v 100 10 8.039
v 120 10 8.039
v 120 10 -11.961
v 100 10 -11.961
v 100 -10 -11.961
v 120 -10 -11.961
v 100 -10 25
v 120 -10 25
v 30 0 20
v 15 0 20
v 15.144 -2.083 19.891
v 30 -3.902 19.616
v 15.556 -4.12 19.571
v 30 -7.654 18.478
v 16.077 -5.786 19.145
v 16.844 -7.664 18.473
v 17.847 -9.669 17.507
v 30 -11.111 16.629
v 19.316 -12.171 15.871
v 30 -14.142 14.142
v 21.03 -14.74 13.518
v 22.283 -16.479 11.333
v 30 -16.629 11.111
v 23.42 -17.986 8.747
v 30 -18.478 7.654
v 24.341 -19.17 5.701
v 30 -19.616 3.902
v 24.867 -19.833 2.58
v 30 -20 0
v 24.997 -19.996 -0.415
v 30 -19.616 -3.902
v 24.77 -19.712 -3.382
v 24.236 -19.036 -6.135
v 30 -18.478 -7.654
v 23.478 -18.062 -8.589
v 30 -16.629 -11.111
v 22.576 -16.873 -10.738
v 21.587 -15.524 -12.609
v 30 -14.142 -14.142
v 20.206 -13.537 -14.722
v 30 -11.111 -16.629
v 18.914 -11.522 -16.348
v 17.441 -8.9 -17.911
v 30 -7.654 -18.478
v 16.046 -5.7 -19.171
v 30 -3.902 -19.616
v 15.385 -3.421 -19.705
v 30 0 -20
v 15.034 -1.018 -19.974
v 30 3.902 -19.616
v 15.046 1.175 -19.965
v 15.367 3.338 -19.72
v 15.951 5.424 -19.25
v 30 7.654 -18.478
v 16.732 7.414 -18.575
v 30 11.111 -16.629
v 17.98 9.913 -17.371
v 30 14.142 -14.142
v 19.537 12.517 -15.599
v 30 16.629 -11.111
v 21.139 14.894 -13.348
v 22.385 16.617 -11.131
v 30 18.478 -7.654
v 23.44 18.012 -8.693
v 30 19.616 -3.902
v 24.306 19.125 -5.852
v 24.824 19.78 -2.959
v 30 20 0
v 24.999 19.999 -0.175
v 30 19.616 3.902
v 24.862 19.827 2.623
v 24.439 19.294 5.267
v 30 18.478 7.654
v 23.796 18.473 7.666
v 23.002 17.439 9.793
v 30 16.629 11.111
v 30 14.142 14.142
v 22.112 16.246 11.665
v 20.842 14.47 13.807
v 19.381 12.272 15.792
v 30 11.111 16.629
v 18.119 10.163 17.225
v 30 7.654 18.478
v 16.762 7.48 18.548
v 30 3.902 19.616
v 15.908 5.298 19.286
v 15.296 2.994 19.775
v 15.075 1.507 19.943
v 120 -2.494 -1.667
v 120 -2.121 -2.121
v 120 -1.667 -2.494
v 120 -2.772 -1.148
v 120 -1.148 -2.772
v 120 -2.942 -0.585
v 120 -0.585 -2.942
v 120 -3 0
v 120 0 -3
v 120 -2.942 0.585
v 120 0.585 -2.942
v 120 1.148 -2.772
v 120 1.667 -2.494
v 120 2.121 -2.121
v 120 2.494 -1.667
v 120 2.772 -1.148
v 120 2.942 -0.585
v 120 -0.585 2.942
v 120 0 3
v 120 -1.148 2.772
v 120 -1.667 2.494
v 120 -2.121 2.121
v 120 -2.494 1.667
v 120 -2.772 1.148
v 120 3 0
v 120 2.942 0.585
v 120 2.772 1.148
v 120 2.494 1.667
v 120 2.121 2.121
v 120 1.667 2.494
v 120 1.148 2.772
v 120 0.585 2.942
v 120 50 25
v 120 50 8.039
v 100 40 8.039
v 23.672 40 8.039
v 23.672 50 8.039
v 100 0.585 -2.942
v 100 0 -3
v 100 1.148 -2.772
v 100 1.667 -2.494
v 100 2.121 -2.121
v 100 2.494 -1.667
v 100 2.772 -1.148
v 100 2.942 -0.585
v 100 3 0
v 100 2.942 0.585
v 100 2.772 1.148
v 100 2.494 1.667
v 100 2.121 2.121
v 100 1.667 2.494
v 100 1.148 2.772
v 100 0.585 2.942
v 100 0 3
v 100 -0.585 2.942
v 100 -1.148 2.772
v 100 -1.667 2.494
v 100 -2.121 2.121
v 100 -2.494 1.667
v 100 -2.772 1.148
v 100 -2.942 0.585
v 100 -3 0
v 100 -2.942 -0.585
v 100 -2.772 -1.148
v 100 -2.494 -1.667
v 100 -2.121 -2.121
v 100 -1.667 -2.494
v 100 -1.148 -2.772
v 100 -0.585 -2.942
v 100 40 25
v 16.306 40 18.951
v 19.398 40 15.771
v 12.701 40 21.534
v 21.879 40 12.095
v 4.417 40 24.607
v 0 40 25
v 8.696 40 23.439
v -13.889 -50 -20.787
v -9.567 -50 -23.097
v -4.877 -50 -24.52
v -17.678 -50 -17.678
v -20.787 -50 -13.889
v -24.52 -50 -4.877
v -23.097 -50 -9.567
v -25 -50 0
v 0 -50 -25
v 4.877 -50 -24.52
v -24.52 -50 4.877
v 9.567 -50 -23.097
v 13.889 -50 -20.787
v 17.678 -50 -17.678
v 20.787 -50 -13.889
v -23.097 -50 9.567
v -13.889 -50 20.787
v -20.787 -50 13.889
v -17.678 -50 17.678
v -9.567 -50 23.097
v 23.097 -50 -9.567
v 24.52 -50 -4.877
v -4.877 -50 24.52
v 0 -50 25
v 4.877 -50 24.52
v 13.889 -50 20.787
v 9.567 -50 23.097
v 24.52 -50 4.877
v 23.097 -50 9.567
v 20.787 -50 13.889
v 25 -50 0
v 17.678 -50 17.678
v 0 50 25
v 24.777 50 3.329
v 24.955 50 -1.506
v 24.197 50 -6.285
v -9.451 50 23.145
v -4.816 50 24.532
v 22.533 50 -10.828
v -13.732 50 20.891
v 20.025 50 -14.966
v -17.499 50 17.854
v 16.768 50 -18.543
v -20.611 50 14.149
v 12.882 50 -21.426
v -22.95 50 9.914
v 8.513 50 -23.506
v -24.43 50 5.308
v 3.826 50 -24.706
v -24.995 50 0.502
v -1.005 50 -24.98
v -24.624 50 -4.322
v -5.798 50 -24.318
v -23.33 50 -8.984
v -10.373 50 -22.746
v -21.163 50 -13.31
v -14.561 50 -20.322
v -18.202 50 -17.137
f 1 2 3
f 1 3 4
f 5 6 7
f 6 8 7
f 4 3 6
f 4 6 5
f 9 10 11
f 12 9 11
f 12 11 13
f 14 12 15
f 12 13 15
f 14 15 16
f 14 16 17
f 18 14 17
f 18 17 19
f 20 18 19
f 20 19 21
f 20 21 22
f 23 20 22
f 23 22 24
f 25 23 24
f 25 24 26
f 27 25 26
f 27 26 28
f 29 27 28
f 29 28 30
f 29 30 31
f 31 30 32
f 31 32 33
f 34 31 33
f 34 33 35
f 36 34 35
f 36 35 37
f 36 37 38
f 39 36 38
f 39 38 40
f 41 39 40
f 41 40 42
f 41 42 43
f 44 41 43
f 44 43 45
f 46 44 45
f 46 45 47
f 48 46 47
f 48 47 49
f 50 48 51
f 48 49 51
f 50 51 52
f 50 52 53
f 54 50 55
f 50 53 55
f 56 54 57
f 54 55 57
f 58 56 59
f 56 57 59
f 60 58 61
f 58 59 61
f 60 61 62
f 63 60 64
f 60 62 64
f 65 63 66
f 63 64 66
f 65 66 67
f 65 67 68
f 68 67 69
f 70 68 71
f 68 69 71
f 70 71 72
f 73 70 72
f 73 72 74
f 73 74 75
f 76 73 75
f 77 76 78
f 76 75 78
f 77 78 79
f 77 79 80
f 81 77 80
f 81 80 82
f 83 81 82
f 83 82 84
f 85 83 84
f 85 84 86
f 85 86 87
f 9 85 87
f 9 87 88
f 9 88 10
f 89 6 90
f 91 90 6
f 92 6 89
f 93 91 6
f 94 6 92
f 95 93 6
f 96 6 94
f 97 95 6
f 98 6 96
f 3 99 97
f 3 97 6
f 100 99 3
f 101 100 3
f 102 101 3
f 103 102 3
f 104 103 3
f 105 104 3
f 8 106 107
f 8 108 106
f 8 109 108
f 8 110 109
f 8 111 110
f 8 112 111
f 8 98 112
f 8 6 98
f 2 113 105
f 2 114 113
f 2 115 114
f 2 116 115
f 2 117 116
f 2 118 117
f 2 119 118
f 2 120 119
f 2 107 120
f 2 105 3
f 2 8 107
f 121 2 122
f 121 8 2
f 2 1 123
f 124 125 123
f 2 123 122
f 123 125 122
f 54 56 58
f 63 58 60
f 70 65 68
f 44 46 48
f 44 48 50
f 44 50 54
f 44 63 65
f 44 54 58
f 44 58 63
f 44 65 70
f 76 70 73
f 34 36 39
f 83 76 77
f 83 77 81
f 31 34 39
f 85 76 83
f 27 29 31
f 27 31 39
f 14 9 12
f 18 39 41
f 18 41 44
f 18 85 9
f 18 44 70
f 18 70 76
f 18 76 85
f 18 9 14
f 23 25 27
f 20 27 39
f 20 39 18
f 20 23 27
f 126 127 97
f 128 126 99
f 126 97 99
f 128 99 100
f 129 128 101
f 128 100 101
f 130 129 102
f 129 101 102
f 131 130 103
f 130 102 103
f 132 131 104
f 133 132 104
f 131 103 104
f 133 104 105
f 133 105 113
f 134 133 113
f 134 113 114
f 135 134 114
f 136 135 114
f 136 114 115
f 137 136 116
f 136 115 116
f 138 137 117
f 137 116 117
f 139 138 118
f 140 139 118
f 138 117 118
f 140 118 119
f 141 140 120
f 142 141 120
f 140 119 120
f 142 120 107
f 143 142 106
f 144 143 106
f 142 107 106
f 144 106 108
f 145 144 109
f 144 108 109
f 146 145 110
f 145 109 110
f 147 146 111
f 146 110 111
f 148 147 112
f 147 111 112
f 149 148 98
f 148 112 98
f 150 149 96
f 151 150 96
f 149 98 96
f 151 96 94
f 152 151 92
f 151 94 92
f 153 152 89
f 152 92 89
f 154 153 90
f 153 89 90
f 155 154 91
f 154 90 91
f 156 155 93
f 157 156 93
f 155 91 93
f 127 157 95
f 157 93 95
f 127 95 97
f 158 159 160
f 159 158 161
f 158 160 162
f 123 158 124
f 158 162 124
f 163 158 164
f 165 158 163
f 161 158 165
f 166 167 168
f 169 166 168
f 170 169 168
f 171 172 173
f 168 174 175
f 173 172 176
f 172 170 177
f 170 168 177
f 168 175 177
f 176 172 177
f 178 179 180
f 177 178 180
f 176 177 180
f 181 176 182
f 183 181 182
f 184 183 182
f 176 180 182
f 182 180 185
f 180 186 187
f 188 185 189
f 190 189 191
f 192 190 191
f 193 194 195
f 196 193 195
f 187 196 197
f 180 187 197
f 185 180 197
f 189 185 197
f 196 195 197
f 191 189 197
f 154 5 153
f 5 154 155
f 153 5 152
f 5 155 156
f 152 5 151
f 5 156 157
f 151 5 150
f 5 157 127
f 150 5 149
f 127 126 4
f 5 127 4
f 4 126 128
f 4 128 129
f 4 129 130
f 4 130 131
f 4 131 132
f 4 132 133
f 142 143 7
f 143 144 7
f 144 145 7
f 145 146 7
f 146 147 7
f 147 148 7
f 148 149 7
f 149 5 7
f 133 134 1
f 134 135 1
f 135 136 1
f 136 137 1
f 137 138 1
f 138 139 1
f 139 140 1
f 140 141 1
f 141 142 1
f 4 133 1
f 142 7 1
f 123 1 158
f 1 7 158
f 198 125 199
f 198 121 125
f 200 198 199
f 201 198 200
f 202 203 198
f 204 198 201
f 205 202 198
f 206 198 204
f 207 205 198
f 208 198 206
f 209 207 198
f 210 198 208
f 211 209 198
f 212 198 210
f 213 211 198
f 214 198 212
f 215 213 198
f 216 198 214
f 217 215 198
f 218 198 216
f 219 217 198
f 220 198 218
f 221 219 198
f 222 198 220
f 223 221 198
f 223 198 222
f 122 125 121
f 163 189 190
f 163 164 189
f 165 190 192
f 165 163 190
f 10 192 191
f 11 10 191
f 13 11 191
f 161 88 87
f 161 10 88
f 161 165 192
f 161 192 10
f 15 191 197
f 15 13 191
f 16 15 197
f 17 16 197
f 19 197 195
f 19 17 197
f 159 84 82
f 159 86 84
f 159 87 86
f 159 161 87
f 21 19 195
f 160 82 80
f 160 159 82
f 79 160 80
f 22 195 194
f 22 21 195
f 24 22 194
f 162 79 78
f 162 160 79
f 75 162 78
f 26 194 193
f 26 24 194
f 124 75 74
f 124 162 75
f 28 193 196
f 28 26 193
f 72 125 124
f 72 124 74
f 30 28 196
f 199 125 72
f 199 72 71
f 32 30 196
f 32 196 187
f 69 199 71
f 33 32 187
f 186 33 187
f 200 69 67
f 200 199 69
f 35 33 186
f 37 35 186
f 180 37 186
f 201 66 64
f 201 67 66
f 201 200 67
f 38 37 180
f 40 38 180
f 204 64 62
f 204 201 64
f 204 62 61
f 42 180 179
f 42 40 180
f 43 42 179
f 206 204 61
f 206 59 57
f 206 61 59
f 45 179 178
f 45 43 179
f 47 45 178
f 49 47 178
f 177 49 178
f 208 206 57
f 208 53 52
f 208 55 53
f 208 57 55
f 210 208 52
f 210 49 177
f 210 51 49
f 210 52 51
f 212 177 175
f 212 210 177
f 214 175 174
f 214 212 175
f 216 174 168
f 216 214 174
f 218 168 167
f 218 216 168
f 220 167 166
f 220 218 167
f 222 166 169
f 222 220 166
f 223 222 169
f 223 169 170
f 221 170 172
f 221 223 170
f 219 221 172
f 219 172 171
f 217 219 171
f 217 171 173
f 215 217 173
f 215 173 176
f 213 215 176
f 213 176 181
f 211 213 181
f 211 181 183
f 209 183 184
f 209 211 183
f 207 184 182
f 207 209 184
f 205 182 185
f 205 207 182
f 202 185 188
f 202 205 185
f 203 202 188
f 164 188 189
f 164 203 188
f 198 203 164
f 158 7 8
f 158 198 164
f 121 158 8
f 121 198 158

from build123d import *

# Parameters (mm, degrees)
SKETCH1_R           = 25
BOSS_EXTRUDE1_DEPTH = 50
SKETCH2_R           = 20
BOSS_EXTRUDE2_DEPTH = 30
SKETCH3_W           = 16.960857005
SKETCH3_H           = 10
BOSS_EXTRUDE3_DEPTH = 120
SKETCH4_W           = 20
SKETCH4_H           = 16.960857005
BOSS_EXTRUDE4_DEPTH = 50
SKETCH5_W           = 20
SKETCH5_H           = 20
BOSS_EXTRUDE5_DEPTH = 20
SKETCH6_R           = 3
CUT_EXTRUDE1_DEPTH  = 20


with BuildPart() as part:
    # Sketch1 → Boss-Extrude1 (new, symmetric)
    with BuildSketch(Plane(origin=(0, 0, 0), x_dir=(1, 0, 0), z_dir=(0, 1, 0))):
        with Locations(Location((0, 0, 0), (0, 0, 270))):
            Circle(SKETCH1_R)
    extrude(amount=BOSS_EXTRUDE1_DEPTH, both=True)

    # Sketch2 → Boss-Extrude2 (add)
    with BuildSketch(Plane(origin=(0, 0, 0), x_dir=(0, 0, -1), z_dir=(1, 0, 0))):
        with Locations(Location((0, 0, 0), (0, 0, 180))):
            Circle(SKETCH2_R)
    extrude(amount=BOSS_EXTRUDE2_DEPTH)

    # Sketch3 → Boss-Extrude3 (add)
    with BuildSketch(Plane(origin=(0, 0, 0), x_dir=(0, 0, -1), z_dir=(1, 0, 0))):
        with Locations((-16.519571497, 45)):
            Rectangle(SKETCH3_W, SKETCH3_H)
    extrude(amount=BOSS_EXTRUDE3_DEPTH)

    # Sketch4 → Boss-Extrude4 (add)
    with BuildSketch(Plane.XZ.offset(-40)):
        with Locations((110, 16.519571497)):
            Rectangle(SKETCH4_W, SKETCH4_H)
    extrude(amount=BOSS_EXTRUDE4_DEPTH)

    # Sketch5 → Boss-Extrude5 (add)
    with BuildSketch(Plane(origin=(0, 0, 8.039142995), x_dir=(-1, 0, 0), z_dir=(0, 0, -1))):
        with Locations((-110, 0)):
            Rectangle(SKETCH5_W, SKETCH5_H)
    extrude(amount=BOSS_EXTRUDE5_DEPTH)

    # Sketch6 → Cut-Extrude1 (cut)
    with BuildSketch(Plane(origin=(120, 0, 0), x_dir=(0, 0, -1), z_dir=(1, 0, 0))):
        Circle(SKETCH6_R)
    extrude(amount=-CUT_EXTRUDE1_DEPTH, mode=Mode.SUBTRACT)


solid = part.part
